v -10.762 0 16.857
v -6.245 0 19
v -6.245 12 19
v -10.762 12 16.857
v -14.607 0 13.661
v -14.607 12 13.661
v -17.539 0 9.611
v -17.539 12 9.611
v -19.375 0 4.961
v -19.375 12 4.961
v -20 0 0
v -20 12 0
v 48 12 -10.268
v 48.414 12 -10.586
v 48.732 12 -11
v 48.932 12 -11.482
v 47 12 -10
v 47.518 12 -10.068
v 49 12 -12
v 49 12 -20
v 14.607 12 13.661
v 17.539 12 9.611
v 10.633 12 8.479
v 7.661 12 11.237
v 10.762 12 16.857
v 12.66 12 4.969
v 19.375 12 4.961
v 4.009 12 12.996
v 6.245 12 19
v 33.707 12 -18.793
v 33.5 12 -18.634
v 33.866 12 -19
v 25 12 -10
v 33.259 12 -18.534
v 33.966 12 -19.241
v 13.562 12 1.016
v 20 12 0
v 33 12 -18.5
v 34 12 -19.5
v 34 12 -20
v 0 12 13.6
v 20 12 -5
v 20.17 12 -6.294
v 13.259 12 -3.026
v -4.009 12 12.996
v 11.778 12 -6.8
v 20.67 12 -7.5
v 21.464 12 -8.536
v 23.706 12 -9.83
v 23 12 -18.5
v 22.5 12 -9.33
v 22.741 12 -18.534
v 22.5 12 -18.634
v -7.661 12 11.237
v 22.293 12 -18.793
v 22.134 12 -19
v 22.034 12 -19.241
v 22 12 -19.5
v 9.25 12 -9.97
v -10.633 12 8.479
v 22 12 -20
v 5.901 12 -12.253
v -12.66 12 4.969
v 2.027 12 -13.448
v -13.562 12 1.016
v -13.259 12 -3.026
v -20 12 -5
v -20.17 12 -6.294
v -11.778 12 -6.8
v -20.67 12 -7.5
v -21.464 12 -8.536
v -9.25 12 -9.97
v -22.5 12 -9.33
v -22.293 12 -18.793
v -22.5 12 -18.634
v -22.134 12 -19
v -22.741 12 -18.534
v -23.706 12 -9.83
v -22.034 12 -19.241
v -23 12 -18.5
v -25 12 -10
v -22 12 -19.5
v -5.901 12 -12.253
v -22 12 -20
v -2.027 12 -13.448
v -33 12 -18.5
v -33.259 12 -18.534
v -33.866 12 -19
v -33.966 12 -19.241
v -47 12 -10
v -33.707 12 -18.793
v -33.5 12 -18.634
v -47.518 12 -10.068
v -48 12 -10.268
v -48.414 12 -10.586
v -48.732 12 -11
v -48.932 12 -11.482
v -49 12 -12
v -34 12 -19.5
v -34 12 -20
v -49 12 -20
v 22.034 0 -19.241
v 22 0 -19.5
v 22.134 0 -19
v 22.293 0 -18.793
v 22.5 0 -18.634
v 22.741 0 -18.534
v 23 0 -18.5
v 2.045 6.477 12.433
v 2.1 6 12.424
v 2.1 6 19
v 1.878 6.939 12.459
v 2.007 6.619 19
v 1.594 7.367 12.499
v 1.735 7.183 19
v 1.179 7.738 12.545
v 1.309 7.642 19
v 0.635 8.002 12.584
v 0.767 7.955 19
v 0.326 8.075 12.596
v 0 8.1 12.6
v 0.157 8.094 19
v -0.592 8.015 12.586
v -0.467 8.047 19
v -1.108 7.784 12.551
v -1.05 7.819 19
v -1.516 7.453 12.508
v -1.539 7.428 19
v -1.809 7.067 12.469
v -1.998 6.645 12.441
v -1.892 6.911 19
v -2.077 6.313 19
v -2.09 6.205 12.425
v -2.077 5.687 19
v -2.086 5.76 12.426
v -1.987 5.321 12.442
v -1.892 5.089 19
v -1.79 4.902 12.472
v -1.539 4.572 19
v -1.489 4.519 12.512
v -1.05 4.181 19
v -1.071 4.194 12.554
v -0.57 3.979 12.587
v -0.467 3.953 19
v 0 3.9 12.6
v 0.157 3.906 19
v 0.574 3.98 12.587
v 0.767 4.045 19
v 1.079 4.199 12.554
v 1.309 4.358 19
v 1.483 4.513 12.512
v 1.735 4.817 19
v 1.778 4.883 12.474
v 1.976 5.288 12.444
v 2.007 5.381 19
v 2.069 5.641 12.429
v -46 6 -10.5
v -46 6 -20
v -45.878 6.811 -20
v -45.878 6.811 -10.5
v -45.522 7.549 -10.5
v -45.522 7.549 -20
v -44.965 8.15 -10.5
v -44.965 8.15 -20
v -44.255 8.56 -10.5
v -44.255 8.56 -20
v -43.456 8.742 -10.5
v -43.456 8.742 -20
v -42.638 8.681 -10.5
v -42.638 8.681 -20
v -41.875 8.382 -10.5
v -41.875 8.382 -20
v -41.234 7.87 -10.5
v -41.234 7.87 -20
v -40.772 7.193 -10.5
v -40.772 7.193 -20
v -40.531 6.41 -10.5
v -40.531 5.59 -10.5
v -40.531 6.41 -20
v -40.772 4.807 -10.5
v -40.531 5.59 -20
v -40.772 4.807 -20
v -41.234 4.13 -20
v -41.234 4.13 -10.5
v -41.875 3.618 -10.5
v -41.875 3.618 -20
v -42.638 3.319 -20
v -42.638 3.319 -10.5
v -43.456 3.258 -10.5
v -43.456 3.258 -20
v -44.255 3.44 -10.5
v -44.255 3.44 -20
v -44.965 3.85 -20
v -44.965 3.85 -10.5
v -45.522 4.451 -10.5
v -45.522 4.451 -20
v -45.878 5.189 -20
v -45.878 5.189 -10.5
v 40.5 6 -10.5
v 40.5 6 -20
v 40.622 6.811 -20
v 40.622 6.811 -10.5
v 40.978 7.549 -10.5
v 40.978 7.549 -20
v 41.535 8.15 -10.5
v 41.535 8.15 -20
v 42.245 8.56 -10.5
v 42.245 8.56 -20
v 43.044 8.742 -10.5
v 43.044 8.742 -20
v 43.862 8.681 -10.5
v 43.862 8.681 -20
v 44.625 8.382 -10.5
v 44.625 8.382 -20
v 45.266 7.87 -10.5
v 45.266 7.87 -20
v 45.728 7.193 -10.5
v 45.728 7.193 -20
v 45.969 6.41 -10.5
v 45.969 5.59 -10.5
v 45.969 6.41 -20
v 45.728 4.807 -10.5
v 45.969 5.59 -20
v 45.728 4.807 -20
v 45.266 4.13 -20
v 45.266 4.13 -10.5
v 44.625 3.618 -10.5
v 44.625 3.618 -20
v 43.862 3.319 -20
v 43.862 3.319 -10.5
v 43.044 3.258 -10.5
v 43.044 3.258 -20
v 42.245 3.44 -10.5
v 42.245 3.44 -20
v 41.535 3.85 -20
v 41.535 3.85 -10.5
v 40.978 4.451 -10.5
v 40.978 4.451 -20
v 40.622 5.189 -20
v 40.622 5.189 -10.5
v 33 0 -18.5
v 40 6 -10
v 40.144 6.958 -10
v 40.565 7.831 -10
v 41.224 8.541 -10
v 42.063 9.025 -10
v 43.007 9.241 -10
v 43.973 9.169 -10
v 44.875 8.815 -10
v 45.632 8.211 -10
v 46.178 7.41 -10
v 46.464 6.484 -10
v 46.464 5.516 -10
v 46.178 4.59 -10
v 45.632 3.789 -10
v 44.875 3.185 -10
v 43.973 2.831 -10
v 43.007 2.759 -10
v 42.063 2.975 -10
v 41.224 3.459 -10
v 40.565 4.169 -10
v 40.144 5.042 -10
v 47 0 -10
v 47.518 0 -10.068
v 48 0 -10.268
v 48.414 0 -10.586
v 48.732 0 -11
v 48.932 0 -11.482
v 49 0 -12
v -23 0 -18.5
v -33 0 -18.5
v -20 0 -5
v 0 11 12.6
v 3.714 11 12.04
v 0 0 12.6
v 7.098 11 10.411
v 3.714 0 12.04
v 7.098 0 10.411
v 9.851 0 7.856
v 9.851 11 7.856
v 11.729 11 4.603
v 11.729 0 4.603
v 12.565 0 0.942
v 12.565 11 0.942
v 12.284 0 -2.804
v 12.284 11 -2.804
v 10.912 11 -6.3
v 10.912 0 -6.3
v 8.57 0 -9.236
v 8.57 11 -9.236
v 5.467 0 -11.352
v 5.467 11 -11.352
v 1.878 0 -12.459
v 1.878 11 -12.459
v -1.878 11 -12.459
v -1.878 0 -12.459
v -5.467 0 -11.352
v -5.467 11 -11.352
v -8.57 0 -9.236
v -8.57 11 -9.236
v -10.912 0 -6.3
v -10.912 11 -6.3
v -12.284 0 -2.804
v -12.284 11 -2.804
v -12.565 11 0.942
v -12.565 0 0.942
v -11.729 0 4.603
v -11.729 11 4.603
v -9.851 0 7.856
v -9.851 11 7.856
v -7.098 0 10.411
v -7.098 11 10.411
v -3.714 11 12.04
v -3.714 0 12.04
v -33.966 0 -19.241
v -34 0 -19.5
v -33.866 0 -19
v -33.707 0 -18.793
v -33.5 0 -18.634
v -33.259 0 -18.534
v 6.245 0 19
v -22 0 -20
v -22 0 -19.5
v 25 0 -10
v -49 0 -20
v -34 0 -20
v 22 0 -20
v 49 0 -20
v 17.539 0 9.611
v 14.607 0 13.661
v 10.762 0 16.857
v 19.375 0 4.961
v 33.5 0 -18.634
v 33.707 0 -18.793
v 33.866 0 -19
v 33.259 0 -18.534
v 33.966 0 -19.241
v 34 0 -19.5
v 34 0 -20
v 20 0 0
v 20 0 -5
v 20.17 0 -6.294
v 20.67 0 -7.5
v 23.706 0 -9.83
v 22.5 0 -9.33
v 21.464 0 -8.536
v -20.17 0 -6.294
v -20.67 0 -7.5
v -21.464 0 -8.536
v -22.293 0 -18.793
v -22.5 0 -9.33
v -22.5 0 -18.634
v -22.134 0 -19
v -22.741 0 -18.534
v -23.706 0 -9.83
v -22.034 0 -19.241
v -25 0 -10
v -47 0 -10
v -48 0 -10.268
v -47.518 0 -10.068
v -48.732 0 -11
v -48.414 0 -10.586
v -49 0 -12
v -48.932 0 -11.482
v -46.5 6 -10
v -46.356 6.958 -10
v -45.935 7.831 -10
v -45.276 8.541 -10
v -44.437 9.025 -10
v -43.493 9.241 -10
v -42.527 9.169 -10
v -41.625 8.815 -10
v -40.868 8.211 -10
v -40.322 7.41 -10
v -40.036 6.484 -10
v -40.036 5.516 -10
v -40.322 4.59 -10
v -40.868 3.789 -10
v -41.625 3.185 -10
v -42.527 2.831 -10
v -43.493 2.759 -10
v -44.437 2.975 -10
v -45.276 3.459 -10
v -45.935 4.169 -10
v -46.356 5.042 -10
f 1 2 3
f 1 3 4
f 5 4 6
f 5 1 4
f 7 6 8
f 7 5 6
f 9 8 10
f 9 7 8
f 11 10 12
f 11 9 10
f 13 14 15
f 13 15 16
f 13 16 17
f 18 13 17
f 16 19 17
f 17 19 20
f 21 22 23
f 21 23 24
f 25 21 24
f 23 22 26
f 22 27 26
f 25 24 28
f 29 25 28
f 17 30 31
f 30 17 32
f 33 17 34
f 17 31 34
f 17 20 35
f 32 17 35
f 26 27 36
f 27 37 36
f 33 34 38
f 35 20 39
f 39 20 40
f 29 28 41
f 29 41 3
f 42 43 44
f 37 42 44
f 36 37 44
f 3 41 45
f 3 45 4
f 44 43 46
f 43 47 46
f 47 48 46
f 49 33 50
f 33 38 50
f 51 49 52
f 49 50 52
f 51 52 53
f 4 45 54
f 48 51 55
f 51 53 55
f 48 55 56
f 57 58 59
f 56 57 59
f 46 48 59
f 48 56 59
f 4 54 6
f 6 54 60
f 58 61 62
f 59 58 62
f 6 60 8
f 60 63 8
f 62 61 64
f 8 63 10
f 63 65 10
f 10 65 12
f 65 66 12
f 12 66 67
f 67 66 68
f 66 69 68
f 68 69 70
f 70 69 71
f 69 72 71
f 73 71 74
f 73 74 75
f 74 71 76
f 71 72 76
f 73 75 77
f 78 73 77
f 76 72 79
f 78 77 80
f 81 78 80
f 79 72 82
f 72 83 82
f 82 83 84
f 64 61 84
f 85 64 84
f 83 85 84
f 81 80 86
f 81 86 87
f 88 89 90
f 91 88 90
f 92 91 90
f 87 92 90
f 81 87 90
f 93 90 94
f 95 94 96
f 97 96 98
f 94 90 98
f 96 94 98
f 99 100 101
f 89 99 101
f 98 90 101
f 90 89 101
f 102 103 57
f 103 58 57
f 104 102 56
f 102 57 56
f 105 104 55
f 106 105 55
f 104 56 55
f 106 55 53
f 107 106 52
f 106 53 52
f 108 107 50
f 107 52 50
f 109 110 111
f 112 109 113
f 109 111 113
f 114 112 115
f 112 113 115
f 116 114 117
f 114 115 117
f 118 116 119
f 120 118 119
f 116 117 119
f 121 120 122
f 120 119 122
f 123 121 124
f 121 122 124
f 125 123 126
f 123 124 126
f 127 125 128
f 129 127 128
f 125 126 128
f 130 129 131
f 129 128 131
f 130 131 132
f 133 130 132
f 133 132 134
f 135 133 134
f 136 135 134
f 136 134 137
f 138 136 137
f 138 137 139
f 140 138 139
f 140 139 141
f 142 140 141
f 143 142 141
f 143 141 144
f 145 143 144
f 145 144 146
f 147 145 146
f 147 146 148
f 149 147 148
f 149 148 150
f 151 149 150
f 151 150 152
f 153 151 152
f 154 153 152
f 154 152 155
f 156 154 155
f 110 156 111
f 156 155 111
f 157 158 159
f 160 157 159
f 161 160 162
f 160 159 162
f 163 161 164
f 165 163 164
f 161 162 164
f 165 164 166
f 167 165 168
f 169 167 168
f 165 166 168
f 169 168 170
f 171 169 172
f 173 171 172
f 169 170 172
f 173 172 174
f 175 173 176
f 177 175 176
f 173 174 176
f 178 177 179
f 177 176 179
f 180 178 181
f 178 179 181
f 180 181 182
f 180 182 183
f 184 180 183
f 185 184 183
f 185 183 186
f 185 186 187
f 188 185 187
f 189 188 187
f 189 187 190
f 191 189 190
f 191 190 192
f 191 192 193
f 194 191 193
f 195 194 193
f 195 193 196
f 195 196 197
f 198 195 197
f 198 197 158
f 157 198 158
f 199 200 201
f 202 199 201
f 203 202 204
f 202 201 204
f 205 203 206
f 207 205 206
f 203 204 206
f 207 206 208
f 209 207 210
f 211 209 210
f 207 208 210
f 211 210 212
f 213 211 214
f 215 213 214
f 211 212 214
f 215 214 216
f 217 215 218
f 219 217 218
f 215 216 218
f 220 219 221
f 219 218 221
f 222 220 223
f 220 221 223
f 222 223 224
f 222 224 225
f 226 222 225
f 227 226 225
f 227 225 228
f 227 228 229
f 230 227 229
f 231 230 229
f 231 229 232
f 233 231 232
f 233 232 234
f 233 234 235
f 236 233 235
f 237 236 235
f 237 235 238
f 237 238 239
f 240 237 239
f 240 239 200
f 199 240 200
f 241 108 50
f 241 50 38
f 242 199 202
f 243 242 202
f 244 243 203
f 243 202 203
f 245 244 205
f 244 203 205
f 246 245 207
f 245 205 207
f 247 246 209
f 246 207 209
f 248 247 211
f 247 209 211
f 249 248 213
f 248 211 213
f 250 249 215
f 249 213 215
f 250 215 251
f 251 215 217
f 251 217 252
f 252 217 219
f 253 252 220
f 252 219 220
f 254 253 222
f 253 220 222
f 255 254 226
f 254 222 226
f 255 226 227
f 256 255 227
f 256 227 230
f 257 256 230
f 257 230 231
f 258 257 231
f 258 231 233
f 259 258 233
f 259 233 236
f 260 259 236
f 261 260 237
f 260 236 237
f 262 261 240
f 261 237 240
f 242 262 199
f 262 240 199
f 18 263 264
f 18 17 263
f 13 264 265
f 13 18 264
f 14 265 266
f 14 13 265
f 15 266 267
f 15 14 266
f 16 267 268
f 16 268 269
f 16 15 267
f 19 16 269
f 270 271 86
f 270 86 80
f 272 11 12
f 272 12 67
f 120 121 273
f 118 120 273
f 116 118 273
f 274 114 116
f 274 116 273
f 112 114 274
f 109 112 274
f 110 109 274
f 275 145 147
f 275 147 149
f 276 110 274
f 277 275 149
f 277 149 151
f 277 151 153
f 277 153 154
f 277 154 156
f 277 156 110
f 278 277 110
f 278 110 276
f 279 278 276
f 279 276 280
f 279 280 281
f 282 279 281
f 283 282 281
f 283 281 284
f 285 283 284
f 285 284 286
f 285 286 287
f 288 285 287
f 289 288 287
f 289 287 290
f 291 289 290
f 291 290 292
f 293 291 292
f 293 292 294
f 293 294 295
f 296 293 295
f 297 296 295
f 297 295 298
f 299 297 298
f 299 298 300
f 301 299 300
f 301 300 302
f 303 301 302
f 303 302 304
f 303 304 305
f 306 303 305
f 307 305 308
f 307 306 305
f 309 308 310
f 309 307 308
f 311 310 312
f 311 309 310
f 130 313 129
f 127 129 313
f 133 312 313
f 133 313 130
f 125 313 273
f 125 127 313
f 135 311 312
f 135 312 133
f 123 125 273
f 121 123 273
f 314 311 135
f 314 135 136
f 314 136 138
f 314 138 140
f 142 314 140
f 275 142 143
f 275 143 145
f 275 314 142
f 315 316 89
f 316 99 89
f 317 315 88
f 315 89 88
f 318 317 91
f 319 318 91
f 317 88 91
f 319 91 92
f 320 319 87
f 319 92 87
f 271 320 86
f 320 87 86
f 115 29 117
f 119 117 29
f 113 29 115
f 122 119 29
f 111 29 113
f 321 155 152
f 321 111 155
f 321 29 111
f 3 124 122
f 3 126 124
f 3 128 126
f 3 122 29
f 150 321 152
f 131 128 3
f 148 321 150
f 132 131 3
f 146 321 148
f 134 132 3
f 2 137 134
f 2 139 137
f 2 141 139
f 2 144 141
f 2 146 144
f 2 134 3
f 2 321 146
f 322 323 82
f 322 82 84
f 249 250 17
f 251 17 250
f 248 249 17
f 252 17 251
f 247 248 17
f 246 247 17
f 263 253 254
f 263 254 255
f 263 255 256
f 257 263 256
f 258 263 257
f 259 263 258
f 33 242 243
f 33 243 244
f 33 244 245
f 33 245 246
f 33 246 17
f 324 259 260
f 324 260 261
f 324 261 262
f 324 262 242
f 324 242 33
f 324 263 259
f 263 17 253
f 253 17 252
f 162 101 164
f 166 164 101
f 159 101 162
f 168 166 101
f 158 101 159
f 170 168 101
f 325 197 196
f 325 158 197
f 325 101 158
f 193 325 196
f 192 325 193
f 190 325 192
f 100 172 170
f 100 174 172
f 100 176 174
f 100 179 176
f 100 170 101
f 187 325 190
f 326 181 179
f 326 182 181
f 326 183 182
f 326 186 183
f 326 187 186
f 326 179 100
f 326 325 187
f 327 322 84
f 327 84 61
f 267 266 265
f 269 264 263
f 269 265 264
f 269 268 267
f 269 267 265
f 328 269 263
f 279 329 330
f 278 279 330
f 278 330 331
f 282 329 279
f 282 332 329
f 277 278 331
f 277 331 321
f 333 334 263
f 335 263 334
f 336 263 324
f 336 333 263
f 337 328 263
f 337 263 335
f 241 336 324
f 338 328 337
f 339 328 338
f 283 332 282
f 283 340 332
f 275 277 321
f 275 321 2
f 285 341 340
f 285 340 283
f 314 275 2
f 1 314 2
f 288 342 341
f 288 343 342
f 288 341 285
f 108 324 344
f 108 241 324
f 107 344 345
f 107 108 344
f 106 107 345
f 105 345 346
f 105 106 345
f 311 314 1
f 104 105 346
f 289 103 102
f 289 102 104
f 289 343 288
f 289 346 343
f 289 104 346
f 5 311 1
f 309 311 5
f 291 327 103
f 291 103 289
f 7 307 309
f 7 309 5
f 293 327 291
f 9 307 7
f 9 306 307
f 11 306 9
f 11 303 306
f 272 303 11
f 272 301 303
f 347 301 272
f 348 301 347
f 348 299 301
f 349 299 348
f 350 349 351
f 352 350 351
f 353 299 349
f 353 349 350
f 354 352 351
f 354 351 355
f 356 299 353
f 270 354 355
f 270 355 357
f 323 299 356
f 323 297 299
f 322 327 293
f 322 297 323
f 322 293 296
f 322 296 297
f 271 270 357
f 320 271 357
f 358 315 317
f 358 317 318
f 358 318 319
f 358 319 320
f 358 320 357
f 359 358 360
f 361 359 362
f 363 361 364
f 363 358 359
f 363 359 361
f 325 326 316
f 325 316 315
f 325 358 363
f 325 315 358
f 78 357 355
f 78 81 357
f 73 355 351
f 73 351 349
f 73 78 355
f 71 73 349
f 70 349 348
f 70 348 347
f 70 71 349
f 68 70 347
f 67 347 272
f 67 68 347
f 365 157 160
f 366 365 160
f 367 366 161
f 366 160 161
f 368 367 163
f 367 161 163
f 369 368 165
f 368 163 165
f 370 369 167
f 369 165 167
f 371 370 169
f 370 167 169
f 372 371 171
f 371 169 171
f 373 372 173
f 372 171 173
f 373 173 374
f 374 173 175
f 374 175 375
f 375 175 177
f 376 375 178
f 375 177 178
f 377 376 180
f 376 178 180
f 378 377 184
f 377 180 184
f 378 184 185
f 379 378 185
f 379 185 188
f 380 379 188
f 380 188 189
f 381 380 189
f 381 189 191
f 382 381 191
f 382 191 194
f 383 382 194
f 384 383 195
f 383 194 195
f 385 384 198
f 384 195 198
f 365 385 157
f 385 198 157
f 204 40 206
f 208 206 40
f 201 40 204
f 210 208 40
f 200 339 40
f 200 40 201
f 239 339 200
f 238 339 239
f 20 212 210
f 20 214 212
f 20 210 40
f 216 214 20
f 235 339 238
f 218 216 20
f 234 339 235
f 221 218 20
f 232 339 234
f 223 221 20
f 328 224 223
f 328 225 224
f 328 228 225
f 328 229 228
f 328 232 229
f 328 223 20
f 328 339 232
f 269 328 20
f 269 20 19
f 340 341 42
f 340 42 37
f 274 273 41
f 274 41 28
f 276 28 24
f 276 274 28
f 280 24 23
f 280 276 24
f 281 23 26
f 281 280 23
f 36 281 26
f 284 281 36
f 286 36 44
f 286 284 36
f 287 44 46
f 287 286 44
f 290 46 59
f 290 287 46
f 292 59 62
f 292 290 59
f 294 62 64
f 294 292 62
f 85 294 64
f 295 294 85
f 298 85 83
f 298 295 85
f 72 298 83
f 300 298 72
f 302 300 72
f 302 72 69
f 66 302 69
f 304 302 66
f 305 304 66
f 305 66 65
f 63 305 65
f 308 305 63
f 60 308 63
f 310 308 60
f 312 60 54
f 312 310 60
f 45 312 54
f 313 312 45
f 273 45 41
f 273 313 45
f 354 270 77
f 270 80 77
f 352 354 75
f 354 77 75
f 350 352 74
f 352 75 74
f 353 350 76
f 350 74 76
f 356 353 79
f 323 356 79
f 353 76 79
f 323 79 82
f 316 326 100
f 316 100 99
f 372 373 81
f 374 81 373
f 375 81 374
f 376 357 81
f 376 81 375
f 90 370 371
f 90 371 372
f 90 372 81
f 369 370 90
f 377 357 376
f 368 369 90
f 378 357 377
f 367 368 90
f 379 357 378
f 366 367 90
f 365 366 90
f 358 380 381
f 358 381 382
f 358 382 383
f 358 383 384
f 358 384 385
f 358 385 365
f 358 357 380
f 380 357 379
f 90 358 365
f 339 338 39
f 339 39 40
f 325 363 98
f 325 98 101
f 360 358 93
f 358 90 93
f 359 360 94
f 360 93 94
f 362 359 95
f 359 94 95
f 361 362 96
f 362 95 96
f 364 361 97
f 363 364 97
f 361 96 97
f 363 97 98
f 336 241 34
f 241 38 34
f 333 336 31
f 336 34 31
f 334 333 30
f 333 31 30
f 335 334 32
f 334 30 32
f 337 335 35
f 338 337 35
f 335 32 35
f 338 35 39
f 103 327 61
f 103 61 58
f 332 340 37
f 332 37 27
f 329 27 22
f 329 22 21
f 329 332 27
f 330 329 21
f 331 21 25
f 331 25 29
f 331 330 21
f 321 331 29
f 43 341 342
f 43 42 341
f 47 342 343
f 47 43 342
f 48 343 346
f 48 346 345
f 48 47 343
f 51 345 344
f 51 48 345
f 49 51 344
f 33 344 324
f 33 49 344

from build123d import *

# Parameters (mm, degrees)
SKETCH1_R                  = 12.6
BOSS_EXTRUDE1_DEPTH        = 12
FILLET1_R                  = 5
FILLET2_R                  = 2
F_5_5_5_5_DIAMETER_HOLE1_D = 5.5
FILLET3_R                  = 1
M5_TAPPED_HOLE1_REACH      = 65.765
M5_TAPPED_HOLE1_BORE_R     = 2.1
CHAMFER1_SIZE              = 0.5
CHAMFER2_SIZE              = 1


with BuildPart() as part:
    # Sketch1 → Boss-Extrude1 (new body)
    with BuildSketch(Plane(origin=(0, 0, 0), x_dir=(1, 0, 0), z_dir=(0, 1, 0))):
        with BuildLine():
            Line((-49, 20), (-34, 20))
            Line((-34, 20), (-34, 18.5))
            Line((-34, 18.5), (-22, 18.5))
            Line((-22, 18.5), (-22, 20))
            Line((-22, 20), (22, 20))
            Line((22, 20), (22, 18.5))
            Line((22, 18.5), (34, 18.5))
            Line((34, 18.5), (34, 20))
            Line((34, 20), (49, 20))
            Line((49, 20), (49, 10))
            Line((49, 10), (20, 10))
            Line((20, 10), (20, 0))
            ThreePointArc((20, 0), (16.200308021, -11.728172066), (6.244997998, -19))
            Line((6.244997998, -19), (-6.244997998, -19))
            ThreePointArc((-6.244997998, -19), (-16.200308021, -11.728172066), (-20, 0))
            Line((-20, 0), (-20, 10))
            Line((-20, 10), (-49, 10))
            Line((-49, 10), (-49, 20))
        make_face()
        with Locations(Location((0, 0, 0), (0, 0, 270))):
            Circle(SKETCH1_R, mode=Mode.SUBTRACT)
    extrude(amount=BOSS_EXTRUDE1_DEPTH)

    # Fillet1
    fillet1_edges = [part.edges().sort_by_distance(p)[0] for p in [
        (20, 6, -10),
        (-20, 6, -10),
    ]]
    fillet(fillet1_edges, radius=FILLET1_R)

    # Fillet2
    fillet2_edges = [part.edges().sort_by_distance(p)[0] for p in [
        (49, 6, -10),
        (-49, 6, -10),
    ]]
    fillet(fillet2_edges, radius=FILLET2_R)

    # Ø5.5 (5.5) Diameter Hole1 (through all)
    with Locations(Plane.XY.offset(-10)):
        with Locations((-43.25, 6), (43.25, 6)):
            Hole(F_5_5_5_5_DIAMETER_HOLE1_D / 2)

    # Fillet3
    fillet3_edges = [part.edges().sort_by_distance(p)[0] for p in [
        (-34, 6, -18.5),
        (-22, 6, -18.5),
        (22, 6, -18.5),
        (34, 6, -18.5),
    ]]
    fillet(fillet3_edges, radius=FILLET3_R)

    # M5 Tapped Hole1 bore → M5 Tapped Hole1 (cut, up to next)
    with BuildSketch(Plane.XY.offset(19), mode=Mode.PRIVATE) as m5_tapped_hole1_sk1:
        with Locations((0, 6)):
            Circle(M5_TAPPED_HOLE1_BORE_R)
    m5_tapped_hole1_tool1 = extrude(m5_tapped_hole1_sk1.sketch, amount=-M5_TAPPED_HOLE1_REACH, mode=Mode.PRIVATE) & part.part
    add(m5_tapped_hole1_tool1.solids().sort_by_distance((0, 6, 19))[0], mode=Mode.SUBTRACT)

    # Chamfer1
    chamfer1_edges = [part.edges().sort_by_distance(p)[0] for p in [
        (46, 6, -10),
        (-40.5, 6, -10),
    ]]
    chamfer(chamfer1_edges, length=CHAMFER1_SIZE)

    # Chamfer2
    chamfer2_edges = [part.edges().sort_by_distance(p)[0] for p in [
        (0, 12, -12.6),
    ]]
    chamfer(chamfer2_edges, length=CHAMFER2_SIZE)


solid = part.part
